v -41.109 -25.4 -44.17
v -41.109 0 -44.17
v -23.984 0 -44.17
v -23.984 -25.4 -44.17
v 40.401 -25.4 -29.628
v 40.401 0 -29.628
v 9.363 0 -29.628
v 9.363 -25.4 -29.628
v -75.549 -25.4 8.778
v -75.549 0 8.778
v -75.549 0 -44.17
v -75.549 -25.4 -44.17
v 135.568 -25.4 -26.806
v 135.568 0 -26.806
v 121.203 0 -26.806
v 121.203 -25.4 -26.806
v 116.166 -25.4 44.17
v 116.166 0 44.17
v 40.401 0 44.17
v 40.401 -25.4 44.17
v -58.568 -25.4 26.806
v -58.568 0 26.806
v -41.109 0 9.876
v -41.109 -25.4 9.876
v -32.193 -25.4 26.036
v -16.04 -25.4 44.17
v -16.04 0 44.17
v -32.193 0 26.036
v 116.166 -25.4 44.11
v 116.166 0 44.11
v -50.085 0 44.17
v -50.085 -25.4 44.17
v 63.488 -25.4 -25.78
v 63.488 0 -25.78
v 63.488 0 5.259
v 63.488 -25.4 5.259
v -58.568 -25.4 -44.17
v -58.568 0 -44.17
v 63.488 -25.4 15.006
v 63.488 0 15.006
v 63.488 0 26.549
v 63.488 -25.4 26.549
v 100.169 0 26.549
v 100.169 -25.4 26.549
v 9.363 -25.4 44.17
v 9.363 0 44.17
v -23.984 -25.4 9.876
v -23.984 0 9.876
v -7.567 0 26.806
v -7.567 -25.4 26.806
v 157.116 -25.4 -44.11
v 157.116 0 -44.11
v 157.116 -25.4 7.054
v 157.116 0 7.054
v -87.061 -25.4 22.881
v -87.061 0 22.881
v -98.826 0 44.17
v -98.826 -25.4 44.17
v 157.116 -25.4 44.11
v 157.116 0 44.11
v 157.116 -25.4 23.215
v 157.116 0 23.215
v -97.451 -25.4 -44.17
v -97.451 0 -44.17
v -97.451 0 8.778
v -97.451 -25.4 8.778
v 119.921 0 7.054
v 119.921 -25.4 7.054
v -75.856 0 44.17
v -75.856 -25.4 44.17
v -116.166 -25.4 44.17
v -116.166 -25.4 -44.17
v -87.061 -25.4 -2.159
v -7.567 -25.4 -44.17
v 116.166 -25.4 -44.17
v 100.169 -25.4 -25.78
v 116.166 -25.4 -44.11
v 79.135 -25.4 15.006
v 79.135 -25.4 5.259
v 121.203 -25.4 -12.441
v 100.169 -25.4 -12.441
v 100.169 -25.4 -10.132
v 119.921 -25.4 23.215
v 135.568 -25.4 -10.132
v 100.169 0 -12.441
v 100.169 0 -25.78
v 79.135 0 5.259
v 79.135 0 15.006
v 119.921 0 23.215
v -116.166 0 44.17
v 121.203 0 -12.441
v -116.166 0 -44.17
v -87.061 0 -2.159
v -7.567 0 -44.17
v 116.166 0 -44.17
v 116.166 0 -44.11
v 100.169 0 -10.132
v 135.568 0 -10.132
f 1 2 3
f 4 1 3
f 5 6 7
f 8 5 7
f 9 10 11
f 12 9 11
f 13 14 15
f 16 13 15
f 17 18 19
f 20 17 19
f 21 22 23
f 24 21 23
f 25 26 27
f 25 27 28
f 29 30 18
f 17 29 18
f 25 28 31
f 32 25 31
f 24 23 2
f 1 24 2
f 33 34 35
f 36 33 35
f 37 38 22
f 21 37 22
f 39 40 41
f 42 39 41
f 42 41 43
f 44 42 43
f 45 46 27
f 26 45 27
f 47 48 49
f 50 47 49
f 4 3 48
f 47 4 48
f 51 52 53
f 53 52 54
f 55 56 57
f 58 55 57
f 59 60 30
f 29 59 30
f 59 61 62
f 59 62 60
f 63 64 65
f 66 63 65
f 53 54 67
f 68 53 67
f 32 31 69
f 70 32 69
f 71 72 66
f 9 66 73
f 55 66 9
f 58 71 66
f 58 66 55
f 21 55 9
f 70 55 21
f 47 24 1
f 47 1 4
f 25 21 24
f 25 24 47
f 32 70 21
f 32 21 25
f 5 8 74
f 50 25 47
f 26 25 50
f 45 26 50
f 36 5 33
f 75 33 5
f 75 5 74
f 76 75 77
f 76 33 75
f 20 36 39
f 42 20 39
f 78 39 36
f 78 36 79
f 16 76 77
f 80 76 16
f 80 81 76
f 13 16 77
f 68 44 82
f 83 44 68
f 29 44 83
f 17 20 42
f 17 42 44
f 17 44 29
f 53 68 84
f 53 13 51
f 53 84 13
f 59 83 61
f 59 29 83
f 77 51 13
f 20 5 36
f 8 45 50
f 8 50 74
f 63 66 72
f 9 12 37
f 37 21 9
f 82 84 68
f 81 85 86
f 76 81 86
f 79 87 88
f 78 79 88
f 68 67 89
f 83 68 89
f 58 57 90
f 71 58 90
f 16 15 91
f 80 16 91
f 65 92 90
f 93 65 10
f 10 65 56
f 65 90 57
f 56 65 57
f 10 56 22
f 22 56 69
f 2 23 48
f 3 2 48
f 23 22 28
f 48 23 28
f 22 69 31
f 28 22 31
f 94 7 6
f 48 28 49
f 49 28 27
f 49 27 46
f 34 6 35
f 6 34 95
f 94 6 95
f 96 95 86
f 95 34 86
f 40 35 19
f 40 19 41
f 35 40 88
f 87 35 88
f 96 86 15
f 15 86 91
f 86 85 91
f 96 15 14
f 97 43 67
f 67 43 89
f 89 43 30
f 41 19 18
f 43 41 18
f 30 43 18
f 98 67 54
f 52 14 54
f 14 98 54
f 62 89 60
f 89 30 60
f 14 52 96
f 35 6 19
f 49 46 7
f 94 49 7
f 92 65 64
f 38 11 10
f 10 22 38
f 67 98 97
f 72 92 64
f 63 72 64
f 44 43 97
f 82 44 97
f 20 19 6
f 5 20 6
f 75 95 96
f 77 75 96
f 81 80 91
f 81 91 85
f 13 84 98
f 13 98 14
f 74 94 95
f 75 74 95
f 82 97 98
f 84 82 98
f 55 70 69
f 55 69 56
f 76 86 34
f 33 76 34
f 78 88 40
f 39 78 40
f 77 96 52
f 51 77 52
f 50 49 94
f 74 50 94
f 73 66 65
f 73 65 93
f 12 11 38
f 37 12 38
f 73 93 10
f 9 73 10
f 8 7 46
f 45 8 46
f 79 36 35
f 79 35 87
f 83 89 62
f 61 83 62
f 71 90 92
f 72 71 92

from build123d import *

# Parameters (mm, degrees)
F1_DEPTH = 25.4


with BuildPart() as f1:
    # F0 (on Front) → F1 (new body)
    with BuildSketch(Plane.XZ):
        Polygon((-58.56847018, 26.8058441579), (-58.56847018, 44.1696718335), (-75.8564463832, 44.1696718335), (-87.0612412691, 22.8805579245), (-98.826281338, 44.1696718335), (-116.1657199264, 44.1696718335), (-116.1657199264, -44.1696718335), (-97.4510317668, -44.1696718335), (-97.4510317668, 8.7780756876), (-87.0612412691, -2.158543095), (-75.5490139127, 8.7780756876), (-75.5490139127, -44.1696718335), (-58.56847018, -44.1696718335), align=None)
        Polygon((-7.5672003441, 26.8058441579), (-7.5672003441, 44.1696718335), (-16.0395050349, 44.1696718335), (-32.1926623583, 26.0362979025), (-50.0853913032, 44.1696718335), (-58.56847018, 44.1696718335), (-58.56847018, 26.8058441579), (-41.1093979278, 9.8758367822), (-41.1093979278, -44.1696718335), (-23.9841751754, -44.1696718335), (-23.9841751754, 9.8758367822), align=None)
        Polygon((9.3628074974, -29.6275112778), (9.3628074974, 44.1696718335), (-7.5672003441, 44.1696718335), (-7.5672003441, 26.8058441579), (-7.5672003441, -44.1696718335), (40.4011495411, -44.1696718335), (40.4011495411, -29.6275112778), align=None)
        Polygon((116.1657199264, 44.110127064), (116.1657199264, 44.1696718335), (40.4011495411, 44.1696718335), (40.4011495411, -29.6275112778), (40.4011495411, -44.1696718335), (116.1657199264, -44.1696718335), (116.1657199264, -44.110127064), (100.1692116261, -44.110127064), (100.1692116261, -25.7797837257), (63.4875297546, -25.7797837257), (63.4875297546, 5.258561112), (79.1349560022, 5.258561112), (79.1349560022, 15.0061408058), (63.4875297546, 15.0061408058), (63.4875297546, 26.5493281186), (100.1692116261, 26.5493281186), (100.1692116261, 44.110127064), align=None)
        Polygon((157.1156084538, 44.110127064), (116.1657199264, 44.110127064), (116.1657199264, -10.1323537529), (135.5683207512, -10.1323537529), (135.5683207512, -26.8058460206), (121.2034597993, -26.8058460206), (121.2034597993, -12.4409906566), (116.1657199264, -12.4409906566), (116.1657199264, -44.110127064), (157.1156084538, -44.110127064), (157.1156084538, 7.054167334), (119.920887053, 7.054167334), (119.920887053, 23.21462892), (157.1156084538, 23.21462892), align=None)
        Polygon((116.1657199264, -10.1323537529), (116.1657199264, 44.110127064), (100.1692116261, 44.110127064), (100.1692116261, 26.5493281186), (100.1692116261, -10.1323537529), align=None)
        Polygon((116.1657199264, -44.110127064), (116.1657199264, -12.4409906566), (100.1692116261, -12.4409906566), (100.1692116261, -25.7797837257), (100.1692116261, -44.110127064), align=None)
    extrude(amount=F1_DEPTH)


solid = f1.part
